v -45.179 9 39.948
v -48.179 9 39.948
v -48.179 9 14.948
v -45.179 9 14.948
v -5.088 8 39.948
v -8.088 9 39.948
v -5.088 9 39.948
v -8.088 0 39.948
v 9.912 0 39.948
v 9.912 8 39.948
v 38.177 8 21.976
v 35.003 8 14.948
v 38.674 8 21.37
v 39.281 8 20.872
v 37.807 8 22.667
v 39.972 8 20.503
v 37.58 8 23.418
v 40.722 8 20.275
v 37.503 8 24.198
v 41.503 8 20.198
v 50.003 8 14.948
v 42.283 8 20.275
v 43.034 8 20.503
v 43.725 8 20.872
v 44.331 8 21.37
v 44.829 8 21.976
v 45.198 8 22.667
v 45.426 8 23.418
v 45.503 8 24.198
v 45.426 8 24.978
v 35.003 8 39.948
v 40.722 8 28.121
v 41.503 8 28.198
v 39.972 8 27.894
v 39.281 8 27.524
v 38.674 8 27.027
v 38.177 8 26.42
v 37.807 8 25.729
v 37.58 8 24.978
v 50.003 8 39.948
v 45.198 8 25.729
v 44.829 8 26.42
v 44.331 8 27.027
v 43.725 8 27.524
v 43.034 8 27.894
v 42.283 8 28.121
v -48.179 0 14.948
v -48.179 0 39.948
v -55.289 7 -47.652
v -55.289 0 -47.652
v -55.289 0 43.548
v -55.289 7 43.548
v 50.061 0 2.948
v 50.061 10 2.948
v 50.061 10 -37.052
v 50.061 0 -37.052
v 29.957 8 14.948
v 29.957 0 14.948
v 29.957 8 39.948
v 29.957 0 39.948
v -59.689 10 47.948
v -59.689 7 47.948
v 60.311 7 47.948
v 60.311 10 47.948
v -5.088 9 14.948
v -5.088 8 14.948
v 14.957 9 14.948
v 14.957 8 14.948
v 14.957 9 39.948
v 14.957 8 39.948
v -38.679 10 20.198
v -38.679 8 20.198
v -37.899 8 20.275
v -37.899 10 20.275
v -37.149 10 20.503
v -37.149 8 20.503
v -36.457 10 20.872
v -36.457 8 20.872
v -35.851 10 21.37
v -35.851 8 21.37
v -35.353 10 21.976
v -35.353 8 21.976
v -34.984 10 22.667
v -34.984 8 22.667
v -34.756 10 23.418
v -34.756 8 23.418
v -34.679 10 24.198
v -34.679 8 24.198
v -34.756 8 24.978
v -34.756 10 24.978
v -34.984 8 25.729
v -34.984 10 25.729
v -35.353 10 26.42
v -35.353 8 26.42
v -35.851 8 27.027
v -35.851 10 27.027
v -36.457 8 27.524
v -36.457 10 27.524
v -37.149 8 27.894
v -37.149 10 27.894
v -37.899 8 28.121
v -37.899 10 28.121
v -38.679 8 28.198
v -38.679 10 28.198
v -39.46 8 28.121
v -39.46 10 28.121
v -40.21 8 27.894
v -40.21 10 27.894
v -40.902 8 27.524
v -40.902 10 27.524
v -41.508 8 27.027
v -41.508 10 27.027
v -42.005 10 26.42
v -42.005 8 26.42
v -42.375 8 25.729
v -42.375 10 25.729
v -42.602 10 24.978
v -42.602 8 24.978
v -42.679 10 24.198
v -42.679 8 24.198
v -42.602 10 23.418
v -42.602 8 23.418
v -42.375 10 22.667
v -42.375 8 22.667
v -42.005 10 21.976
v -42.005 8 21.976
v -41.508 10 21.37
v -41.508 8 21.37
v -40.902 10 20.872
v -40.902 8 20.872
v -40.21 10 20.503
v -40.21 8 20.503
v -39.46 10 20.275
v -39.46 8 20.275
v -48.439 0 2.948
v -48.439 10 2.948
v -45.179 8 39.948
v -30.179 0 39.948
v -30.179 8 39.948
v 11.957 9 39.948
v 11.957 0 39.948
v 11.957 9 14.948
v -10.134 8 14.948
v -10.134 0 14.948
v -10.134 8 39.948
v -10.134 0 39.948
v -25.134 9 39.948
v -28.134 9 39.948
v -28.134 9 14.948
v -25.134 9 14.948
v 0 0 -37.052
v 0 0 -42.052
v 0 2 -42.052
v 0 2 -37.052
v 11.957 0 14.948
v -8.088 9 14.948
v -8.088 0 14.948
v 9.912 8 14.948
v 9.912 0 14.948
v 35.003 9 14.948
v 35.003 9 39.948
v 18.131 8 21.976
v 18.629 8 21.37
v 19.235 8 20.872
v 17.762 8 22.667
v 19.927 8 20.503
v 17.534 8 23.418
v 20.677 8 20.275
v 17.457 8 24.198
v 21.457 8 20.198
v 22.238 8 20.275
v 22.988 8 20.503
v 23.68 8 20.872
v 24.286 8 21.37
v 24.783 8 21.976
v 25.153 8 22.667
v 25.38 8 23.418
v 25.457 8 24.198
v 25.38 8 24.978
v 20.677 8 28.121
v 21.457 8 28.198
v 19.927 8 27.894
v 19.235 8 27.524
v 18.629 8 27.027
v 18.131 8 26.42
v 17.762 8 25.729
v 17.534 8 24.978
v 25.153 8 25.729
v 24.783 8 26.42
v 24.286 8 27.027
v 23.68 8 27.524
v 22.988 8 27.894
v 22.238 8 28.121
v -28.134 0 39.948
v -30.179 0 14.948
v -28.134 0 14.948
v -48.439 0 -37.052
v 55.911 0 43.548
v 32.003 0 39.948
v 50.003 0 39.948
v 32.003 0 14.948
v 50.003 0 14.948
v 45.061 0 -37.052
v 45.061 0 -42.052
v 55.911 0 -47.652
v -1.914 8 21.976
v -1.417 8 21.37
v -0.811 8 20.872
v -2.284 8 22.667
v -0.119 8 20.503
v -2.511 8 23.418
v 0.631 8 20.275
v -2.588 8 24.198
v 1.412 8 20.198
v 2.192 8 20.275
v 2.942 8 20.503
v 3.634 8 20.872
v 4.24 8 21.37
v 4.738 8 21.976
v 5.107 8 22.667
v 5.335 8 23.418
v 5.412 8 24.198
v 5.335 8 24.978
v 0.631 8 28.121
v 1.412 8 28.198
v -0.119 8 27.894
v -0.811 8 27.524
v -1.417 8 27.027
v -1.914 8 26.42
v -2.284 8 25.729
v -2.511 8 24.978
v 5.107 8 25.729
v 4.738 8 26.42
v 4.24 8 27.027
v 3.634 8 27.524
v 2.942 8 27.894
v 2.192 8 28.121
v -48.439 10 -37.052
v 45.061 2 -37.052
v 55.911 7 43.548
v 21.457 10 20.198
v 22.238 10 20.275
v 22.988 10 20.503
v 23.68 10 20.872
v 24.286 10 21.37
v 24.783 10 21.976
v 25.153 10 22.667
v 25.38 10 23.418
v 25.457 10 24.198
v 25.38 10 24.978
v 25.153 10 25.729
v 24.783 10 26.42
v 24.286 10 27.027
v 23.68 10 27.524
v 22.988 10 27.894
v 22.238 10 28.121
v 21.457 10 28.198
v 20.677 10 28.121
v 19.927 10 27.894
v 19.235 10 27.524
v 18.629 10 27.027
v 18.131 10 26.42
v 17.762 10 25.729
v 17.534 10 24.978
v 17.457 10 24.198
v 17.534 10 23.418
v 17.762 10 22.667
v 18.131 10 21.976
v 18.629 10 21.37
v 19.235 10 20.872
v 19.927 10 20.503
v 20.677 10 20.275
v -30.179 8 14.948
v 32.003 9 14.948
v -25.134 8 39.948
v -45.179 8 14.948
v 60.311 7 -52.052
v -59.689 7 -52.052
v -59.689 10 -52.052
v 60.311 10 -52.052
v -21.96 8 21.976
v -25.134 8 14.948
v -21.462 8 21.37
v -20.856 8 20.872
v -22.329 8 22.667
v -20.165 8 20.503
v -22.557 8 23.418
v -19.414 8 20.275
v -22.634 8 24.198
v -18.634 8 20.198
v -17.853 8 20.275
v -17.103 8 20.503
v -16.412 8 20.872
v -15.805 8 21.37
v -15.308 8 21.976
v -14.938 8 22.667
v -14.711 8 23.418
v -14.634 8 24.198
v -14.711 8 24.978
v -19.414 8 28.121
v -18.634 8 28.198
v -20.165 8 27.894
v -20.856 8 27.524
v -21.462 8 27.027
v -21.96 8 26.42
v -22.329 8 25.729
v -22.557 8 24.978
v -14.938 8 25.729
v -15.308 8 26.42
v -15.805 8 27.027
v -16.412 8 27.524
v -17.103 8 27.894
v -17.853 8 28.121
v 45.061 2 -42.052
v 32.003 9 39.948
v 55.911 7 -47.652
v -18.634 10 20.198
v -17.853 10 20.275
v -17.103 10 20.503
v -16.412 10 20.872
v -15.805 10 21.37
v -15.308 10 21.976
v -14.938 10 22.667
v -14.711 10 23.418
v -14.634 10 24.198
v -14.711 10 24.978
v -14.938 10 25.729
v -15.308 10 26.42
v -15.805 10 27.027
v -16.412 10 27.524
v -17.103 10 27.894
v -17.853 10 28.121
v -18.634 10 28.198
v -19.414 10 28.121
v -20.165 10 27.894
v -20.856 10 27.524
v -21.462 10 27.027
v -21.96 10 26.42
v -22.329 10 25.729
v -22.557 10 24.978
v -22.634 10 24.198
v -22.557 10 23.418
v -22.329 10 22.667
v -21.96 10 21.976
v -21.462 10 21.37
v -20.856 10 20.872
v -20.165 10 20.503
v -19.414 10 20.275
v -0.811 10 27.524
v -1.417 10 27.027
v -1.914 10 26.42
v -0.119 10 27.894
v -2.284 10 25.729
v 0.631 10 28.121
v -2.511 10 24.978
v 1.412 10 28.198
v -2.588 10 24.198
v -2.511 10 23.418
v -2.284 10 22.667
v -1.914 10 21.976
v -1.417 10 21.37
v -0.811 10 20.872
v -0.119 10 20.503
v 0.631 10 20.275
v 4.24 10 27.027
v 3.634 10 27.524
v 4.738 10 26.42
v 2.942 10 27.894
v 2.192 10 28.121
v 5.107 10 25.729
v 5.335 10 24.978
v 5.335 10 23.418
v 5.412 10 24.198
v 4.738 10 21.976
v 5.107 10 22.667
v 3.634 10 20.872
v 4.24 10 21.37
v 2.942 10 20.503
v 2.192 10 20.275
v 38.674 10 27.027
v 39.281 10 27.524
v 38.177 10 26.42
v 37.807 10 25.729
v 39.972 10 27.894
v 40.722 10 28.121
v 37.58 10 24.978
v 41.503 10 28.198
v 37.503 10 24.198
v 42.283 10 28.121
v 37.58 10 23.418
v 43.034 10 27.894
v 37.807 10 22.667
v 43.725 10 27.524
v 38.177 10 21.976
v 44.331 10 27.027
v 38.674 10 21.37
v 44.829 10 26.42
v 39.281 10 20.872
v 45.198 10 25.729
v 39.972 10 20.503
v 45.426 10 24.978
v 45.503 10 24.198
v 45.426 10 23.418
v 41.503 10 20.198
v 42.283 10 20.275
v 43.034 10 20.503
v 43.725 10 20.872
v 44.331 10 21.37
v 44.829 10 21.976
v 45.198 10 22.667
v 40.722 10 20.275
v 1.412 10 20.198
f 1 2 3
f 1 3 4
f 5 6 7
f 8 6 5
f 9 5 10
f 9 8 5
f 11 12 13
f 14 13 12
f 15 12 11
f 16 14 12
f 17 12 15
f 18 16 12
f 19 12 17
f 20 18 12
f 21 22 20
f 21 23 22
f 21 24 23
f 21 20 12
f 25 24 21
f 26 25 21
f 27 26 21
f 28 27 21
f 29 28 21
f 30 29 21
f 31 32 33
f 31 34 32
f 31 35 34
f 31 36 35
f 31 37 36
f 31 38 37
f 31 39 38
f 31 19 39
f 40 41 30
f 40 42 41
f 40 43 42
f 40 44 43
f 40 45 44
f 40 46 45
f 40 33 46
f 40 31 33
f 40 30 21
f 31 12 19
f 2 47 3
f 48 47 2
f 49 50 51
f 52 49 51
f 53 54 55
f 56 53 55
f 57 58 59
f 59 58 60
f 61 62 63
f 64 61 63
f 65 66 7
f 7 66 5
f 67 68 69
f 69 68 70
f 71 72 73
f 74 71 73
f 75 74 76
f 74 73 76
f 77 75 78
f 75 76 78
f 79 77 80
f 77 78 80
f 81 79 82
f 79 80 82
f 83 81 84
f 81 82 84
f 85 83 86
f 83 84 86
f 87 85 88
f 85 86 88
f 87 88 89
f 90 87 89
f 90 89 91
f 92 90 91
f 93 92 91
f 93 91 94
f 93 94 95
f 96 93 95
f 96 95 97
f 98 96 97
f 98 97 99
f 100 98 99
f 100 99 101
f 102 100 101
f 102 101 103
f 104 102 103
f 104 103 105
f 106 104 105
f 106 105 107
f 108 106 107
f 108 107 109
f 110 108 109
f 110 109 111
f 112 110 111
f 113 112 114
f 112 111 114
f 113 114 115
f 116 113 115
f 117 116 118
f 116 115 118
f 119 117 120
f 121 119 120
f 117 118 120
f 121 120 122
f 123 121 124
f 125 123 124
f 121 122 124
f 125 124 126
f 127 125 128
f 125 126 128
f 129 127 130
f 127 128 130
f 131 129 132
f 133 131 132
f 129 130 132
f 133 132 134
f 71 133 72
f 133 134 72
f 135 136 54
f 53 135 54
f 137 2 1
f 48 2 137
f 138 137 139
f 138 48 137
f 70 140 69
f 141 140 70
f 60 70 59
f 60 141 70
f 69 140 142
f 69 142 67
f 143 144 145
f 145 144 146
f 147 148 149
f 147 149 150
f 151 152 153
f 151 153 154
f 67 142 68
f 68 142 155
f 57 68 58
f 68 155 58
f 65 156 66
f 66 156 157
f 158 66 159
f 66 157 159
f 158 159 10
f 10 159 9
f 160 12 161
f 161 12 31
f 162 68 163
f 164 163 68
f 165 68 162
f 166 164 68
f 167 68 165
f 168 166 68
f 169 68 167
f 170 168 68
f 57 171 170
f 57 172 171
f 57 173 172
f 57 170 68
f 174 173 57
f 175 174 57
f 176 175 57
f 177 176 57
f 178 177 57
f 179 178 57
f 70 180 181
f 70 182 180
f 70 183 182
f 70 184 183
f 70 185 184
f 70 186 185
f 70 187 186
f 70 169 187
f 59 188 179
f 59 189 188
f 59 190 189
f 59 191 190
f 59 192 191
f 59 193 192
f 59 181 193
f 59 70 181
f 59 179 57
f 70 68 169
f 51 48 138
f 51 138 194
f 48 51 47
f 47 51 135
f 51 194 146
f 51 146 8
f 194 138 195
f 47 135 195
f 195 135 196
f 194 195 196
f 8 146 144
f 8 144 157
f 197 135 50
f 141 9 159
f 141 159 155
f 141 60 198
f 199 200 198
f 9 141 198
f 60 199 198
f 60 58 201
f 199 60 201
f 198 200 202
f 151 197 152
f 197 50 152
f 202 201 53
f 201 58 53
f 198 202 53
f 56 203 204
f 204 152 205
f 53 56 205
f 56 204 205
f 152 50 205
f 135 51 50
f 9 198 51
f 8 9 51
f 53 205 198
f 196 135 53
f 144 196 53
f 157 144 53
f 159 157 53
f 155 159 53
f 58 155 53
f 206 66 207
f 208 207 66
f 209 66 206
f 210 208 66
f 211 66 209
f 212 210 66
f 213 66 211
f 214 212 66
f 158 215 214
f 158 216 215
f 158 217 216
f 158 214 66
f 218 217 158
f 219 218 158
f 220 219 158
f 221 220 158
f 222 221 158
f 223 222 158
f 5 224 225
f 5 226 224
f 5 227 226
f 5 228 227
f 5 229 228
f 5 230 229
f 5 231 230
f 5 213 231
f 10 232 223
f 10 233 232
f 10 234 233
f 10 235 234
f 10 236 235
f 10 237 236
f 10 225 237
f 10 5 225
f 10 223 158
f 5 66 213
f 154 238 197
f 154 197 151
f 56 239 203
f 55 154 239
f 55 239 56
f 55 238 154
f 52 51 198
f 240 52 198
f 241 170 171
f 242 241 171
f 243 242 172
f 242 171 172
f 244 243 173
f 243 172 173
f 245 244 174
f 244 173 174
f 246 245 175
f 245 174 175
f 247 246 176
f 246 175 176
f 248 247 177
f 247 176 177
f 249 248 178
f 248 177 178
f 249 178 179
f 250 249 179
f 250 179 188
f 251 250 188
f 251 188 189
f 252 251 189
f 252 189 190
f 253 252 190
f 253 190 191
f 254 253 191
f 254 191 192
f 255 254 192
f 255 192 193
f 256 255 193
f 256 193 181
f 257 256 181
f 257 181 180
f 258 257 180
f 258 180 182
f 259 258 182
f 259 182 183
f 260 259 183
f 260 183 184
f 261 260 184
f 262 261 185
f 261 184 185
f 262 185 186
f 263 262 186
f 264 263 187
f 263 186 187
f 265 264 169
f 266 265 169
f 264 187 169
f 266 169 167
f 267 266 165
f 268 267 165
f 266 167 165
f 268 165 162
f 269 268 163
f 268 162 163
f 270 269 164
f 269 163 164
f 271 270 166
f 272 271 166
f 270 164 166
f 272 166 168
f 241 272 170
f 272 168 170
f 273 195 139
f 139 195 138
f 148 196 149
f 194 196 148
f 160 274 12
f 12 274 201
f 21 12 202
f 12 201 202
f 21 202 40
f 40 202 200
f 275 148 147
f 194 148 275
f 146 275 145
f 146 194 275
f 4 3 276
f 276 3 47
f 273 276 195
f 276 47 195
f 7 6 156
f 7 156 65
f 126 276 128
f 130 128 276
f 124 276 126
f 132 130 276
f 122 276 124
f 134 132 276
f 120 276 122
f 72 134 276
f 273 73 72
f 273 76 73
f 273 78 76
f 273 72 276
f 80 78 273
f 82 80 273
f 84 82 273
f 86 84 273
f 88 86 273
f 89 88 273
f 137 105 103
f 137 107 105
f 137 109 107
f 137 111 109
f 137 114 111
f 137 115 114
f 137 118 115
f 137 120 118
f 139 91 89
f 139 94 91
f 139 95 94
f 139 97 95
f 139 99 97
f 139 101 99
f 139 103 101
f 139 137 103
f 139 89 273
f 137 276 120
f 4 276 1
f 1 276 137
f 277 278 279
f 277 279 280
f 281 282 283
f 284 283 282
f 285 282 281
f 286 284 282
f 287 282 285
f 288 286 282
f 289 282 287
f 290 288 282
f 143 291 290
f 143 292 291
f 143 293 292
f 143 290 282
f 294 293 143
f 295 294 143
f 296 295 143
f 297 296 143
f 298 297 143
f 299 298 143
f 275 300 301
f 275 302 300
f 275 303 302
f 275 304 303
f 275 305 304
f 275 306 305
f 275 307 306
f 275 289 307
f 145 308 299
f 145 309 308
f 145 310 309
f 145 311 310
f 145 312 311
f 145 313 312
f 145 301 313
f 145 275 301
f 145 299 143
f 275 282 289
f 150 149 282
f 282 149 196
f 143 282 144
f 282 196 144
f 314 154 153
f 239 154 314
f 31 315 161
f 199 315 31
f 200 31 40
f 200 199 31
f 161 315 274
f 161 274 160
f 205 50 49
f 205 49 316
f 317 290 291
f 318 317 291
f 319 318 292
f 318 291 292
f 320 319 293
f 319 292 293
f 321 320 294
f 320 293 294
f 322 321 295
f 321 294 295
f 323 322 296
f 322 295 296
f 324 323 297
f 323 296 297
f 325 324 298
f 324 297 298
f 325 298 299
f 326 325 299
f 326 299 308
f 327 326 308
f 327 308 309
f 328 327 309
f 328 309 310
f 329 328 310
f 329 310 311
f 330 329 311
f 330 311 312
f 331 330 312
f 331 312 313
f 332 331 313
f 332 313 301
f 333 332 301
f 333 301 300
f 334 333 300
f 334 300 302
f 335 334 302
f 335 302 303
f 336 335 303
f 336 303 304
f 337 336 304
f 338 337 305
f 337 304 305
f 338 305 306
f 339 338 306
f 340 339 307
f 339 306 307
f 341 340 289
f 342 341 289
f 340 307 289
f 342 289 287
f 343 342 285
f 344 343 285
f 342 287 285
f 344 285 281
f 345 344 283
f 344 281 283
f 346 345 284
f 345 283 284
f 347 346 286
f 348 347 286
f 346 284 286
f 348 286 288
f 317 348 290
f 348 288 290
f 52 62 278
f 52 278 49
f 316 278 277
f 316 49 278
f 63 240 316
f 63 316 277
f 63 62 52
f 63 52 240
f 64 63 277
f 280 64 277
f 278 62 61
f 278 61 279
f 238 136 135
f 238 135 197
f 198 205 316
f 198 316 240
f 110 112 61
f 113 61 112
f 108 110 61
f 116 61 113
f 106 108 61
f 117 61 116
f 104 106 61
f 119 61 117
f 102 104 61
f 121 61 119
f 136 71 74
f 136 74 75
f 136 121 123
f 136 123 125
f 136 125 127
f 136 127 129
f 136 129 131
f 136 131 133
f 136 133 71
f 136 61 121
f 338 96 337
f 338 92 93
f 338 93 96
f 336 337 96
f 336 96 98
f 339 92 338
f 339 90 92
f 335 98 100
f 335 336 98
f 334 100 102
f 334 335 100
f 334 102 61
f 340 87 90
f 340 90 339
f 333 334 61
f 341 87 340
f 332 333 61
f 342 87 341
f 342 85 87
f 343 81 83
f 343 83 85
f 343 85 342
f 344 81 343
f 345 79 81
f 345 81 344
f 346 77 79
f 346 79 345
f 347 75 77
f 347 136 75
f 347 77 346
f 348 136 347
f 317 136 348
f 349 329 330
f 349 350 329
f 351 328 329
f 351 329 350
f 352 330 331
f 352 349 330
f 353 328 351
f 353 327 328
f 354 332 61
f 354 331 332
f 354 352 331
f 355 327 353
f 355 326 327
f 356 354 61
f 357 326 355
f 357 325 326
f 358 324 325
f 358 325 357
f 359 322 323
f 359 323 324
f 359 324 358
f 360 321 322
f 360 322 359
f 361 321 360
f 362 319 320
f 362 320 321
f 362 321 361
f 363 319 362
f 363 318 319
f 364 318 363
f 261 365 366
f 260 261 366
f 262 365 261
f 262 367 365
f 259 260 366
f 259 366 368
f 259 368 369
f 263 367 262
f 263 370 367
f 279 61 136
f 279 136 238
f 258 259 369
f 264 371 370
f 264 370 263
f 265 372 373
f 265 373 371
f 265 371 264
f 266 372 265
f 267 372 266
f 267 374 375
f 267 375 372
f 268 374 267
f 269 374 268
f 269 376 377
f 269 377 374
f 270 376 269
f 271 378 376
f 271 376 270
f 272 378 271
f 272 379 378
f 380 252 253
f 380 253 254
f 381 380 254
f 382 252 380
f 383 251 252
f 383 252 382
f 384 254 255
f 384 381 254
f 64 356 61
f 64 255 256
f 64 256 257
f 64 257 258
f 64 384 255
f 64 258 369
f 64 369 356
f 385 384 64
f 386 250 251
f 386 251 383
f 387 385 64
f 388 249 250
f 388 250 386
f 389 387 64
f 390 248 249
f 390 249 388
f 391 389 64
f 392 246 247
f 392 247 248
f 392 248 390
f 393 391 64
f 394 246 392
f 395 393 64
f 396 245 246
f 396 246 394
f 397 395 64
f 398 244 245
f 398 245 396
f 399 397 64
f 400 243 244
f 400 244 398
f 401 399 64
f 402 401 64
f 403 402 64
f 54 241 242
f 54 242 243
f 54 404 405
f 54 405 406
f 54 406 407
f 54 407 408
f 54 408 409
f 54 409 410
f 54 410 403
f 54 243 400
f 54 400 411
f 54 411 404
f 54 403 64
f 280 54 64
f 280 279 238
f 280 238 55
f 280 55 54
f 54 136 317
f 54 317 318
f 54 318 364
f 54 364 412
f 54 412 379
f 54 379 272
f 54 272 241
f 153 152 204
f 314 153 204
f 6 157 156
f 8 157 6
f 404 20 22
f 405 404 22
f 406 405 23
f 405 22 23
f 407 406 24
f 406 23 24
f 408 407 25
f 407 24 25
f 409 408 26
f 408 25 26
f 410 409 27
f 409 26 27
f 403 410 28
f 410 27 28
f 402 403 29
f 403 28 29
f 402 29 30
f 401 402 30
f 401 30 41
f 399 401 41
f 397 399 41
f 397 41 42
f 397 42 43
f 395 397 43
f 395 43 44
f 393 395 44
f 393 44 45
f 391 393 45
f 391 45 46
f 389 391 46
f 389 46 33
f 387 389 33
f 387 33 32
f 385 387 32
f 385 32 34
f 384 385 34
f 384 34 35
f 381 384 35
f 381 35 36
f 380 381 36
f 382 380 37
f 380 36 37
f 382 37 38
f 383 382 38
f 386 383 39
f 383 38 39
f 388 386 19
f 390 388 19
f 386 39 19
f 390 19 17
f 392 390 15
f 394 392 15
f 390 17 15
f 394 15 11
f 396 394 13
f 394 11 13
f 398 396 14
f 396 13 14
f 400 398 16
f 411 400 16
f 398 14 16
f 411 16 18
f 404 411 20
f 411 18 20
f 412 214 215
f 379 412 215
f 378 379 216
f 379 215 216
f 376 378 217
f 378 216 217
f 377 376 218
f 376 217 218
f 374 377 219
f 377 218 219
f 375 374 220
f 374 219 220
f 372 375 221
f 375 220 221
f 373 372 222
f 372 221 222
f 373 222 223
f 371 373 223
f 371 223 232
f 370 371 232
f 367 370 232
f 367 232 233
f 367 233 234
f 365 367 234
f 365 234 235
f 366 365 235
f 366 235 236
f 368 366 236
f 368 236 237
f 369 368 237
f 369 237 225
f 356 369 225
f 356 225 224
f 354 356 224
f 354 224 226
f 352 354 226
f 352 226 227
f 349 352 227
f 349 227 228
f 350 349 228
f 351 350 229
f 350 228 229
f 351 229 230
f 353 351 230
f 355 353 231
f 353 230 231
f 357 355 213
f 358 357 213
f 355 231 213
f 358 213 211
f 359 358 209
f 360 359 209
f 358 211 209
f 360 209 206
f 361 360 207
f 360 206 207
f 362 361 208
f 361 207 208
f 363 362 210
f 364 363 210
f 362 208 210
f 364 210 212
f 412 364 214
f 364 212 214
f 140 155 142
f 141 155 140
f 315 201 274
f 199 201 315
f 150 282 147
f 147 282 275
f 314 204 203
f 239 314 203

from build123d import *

# Parameters (mm, degrees)
SKETCH1_W           = 120
SKETCH1_H           = 100
BOSS_EXTRUDE1_DEPTH = 10
SKETCH2_W           = 98.5
SKETCH2_H           = 40
CUT_EXTRUDE1_DEPTH  = 10
SKETCH3_W           = 120
SKETCH3_H           = 100
SKETCH3_W_2         = 111.2
SKETCH3_H_2         = 91.2
CUT_EXTRUDE3_DEPTH  = 7
SKETCH4_W           = 18
SKETCH4_H           = 25
CUT_EXTRUDE4_DEPTH  = 8
SKETCH5_W           = 3
SKETCH5_H           = 25
CUT_EXTRUDE6_DEPTH  = 1
SKETCH6_R           = 4
CUT_EXTRUDE12_DEPTH = 81.067810822
SKETCH7_W           = 45.061320755
SKETCH7_H           = 5
CUT_EXTRUDE13_DEPTH = 2


with BuildPart() as part:
    # Sketch1 → Boss-Extrude1 (new body)
    with BuildSketch(Plane(origin=(0, 0, 0), x_dir=(1, 0, 0), z_dir=(0, 1, 0))):
        with Locations((0.311320755, 2.051886792)):
            Rectangle(SKETCH1_W, SKETCH1_H)
    extrude(amount=BOSS_EXTRUDE1_DEPTH)

    # Sketch2 → Cut-Extrude1 (cut)
    with BuildSketch(Plane(origin=(0, 10, 0), x_dir=(1, 0, 0), z_dir=(0, 1, 0))):
        with Locations((0.811320755, 17.051886792)):
            Rectangle(SKETCH2_W, SKETCH2_H)
    extrude(amount=-CUT_EXTRUDE1_DEPTH, mode=Mode.SUBTRACT)

    # Sketch3 → Cut-Extrude3 (cut)
    with BuildSketch(Plane.XZ):
        with Locations((0.311320755, -2.051886792)):
            Rectangle(SKETCH3_W, SKETCH3_H)
        with Locations((0.311320755, -2.051886792)):
            Rectangle(SKETCH3_W_2, SKETCH3_H_2, mode=Mode.SUBTRACT)
    extrude(amount=-CUT_EXTRUDE3_DEPTH, mode=Mode.SUBTRACT)

    # Sketch4 → Cut-Extrude4 (cut)
    with BuildSketch(Plane.XZ):
        with Locations((-39.17934754, 27.448113208)):
            Rectangle(SKETCH4_W, SKETCH4_H)
        with Locations((-19.133803456, 27.448113208)):
            Rectangle(SKETCH4_W, SKETCH4_H)
        with Locations((0.911740628, 27.448113208)):
            Rectangle(SKETCH4_W, SKETCH4_H)
        with Locations((20.957284712, 27.448113208)):
            Rectangle(SKETCH4_W, SKETCH4_H)
        with Locations((41.002828796, 27.448113208)):
            Rectangle(SKETCH4_W, SKETCH4_H)
    extrude(amount=-CUT_EXTRUDE4_DEPTH, mode=Mode.SUBTRACT)

    # Sketch5 → Cut-Extrude6 (cut)
    with BuildSketch(Plane.XZ.offset(-8)):
        with Locations((33.502828796, 27.448113208)):
            Rectangle(SKETCH5_W, SKETCH5_H)
        with Locations((13.457284712, 27.448113208)):
            Rectangle(SKETCH5_W, SKETCH5_H)
        with Locations((-6.588259372, 27.448113208)):
            Rectangle(SKETCH5_W, SKETCH5_H)
        with Locations((-26.633803456, 27.448113208)):
            Rectangle(SKETCH5_W, SKETCH5_H)
        with Locations((-46.67934754, 27.448113208)):
            Rectangle(SKETCH5_W, SKETCH5_H)
    extrude(amount=-CUT_EXTRUDE6_DEPTH, mode=Mode.SUBTRACT)

    # Sketch6 → Cut-Extrude12 (cut, through all)
    with BuildSketch(Plane.XZ.offset(-8)):
        with Locations(Location((41.502828796, 24.198113208, 0), (0, 0, 270))):
            Circle(SKETCH6_R)
        with Locations(Location((21.457284712, 24.198113208, 0), (0, 0, 270))):
            Circle(SKETCH6_R)
        with Locations(Location((1.411740628, 24.198113208, 0), (0, 0, 270))):
            Circle(SKETCH6_R)
        with Locations(Location((-18.633803456, 24.198113208, 0), (0, 0, 270))):
            Circle(SKETCH6_R)
        with Locations(Location((-38.67934754, 24.198113208, 0), (0, 0, 270))):
            Circle(SKETCH6_R)
    extrude(amount=-CUT_EXTRUDE12_DEPTH, mode=Mode.SUBTRACT)

    # Sketch7 → Cut-Extrude13 (cut)
    with BuildSketch(Plane.XZ):
        with Locations((22.530660378, -39.551886792)):
            Rectangle(SKETCH7_W, SKETCH7_H)
    extrude(amount=-CUT_EXTRUDE13_DEPTH, mode=Mode.SUBTRACT)


solid = part.part
